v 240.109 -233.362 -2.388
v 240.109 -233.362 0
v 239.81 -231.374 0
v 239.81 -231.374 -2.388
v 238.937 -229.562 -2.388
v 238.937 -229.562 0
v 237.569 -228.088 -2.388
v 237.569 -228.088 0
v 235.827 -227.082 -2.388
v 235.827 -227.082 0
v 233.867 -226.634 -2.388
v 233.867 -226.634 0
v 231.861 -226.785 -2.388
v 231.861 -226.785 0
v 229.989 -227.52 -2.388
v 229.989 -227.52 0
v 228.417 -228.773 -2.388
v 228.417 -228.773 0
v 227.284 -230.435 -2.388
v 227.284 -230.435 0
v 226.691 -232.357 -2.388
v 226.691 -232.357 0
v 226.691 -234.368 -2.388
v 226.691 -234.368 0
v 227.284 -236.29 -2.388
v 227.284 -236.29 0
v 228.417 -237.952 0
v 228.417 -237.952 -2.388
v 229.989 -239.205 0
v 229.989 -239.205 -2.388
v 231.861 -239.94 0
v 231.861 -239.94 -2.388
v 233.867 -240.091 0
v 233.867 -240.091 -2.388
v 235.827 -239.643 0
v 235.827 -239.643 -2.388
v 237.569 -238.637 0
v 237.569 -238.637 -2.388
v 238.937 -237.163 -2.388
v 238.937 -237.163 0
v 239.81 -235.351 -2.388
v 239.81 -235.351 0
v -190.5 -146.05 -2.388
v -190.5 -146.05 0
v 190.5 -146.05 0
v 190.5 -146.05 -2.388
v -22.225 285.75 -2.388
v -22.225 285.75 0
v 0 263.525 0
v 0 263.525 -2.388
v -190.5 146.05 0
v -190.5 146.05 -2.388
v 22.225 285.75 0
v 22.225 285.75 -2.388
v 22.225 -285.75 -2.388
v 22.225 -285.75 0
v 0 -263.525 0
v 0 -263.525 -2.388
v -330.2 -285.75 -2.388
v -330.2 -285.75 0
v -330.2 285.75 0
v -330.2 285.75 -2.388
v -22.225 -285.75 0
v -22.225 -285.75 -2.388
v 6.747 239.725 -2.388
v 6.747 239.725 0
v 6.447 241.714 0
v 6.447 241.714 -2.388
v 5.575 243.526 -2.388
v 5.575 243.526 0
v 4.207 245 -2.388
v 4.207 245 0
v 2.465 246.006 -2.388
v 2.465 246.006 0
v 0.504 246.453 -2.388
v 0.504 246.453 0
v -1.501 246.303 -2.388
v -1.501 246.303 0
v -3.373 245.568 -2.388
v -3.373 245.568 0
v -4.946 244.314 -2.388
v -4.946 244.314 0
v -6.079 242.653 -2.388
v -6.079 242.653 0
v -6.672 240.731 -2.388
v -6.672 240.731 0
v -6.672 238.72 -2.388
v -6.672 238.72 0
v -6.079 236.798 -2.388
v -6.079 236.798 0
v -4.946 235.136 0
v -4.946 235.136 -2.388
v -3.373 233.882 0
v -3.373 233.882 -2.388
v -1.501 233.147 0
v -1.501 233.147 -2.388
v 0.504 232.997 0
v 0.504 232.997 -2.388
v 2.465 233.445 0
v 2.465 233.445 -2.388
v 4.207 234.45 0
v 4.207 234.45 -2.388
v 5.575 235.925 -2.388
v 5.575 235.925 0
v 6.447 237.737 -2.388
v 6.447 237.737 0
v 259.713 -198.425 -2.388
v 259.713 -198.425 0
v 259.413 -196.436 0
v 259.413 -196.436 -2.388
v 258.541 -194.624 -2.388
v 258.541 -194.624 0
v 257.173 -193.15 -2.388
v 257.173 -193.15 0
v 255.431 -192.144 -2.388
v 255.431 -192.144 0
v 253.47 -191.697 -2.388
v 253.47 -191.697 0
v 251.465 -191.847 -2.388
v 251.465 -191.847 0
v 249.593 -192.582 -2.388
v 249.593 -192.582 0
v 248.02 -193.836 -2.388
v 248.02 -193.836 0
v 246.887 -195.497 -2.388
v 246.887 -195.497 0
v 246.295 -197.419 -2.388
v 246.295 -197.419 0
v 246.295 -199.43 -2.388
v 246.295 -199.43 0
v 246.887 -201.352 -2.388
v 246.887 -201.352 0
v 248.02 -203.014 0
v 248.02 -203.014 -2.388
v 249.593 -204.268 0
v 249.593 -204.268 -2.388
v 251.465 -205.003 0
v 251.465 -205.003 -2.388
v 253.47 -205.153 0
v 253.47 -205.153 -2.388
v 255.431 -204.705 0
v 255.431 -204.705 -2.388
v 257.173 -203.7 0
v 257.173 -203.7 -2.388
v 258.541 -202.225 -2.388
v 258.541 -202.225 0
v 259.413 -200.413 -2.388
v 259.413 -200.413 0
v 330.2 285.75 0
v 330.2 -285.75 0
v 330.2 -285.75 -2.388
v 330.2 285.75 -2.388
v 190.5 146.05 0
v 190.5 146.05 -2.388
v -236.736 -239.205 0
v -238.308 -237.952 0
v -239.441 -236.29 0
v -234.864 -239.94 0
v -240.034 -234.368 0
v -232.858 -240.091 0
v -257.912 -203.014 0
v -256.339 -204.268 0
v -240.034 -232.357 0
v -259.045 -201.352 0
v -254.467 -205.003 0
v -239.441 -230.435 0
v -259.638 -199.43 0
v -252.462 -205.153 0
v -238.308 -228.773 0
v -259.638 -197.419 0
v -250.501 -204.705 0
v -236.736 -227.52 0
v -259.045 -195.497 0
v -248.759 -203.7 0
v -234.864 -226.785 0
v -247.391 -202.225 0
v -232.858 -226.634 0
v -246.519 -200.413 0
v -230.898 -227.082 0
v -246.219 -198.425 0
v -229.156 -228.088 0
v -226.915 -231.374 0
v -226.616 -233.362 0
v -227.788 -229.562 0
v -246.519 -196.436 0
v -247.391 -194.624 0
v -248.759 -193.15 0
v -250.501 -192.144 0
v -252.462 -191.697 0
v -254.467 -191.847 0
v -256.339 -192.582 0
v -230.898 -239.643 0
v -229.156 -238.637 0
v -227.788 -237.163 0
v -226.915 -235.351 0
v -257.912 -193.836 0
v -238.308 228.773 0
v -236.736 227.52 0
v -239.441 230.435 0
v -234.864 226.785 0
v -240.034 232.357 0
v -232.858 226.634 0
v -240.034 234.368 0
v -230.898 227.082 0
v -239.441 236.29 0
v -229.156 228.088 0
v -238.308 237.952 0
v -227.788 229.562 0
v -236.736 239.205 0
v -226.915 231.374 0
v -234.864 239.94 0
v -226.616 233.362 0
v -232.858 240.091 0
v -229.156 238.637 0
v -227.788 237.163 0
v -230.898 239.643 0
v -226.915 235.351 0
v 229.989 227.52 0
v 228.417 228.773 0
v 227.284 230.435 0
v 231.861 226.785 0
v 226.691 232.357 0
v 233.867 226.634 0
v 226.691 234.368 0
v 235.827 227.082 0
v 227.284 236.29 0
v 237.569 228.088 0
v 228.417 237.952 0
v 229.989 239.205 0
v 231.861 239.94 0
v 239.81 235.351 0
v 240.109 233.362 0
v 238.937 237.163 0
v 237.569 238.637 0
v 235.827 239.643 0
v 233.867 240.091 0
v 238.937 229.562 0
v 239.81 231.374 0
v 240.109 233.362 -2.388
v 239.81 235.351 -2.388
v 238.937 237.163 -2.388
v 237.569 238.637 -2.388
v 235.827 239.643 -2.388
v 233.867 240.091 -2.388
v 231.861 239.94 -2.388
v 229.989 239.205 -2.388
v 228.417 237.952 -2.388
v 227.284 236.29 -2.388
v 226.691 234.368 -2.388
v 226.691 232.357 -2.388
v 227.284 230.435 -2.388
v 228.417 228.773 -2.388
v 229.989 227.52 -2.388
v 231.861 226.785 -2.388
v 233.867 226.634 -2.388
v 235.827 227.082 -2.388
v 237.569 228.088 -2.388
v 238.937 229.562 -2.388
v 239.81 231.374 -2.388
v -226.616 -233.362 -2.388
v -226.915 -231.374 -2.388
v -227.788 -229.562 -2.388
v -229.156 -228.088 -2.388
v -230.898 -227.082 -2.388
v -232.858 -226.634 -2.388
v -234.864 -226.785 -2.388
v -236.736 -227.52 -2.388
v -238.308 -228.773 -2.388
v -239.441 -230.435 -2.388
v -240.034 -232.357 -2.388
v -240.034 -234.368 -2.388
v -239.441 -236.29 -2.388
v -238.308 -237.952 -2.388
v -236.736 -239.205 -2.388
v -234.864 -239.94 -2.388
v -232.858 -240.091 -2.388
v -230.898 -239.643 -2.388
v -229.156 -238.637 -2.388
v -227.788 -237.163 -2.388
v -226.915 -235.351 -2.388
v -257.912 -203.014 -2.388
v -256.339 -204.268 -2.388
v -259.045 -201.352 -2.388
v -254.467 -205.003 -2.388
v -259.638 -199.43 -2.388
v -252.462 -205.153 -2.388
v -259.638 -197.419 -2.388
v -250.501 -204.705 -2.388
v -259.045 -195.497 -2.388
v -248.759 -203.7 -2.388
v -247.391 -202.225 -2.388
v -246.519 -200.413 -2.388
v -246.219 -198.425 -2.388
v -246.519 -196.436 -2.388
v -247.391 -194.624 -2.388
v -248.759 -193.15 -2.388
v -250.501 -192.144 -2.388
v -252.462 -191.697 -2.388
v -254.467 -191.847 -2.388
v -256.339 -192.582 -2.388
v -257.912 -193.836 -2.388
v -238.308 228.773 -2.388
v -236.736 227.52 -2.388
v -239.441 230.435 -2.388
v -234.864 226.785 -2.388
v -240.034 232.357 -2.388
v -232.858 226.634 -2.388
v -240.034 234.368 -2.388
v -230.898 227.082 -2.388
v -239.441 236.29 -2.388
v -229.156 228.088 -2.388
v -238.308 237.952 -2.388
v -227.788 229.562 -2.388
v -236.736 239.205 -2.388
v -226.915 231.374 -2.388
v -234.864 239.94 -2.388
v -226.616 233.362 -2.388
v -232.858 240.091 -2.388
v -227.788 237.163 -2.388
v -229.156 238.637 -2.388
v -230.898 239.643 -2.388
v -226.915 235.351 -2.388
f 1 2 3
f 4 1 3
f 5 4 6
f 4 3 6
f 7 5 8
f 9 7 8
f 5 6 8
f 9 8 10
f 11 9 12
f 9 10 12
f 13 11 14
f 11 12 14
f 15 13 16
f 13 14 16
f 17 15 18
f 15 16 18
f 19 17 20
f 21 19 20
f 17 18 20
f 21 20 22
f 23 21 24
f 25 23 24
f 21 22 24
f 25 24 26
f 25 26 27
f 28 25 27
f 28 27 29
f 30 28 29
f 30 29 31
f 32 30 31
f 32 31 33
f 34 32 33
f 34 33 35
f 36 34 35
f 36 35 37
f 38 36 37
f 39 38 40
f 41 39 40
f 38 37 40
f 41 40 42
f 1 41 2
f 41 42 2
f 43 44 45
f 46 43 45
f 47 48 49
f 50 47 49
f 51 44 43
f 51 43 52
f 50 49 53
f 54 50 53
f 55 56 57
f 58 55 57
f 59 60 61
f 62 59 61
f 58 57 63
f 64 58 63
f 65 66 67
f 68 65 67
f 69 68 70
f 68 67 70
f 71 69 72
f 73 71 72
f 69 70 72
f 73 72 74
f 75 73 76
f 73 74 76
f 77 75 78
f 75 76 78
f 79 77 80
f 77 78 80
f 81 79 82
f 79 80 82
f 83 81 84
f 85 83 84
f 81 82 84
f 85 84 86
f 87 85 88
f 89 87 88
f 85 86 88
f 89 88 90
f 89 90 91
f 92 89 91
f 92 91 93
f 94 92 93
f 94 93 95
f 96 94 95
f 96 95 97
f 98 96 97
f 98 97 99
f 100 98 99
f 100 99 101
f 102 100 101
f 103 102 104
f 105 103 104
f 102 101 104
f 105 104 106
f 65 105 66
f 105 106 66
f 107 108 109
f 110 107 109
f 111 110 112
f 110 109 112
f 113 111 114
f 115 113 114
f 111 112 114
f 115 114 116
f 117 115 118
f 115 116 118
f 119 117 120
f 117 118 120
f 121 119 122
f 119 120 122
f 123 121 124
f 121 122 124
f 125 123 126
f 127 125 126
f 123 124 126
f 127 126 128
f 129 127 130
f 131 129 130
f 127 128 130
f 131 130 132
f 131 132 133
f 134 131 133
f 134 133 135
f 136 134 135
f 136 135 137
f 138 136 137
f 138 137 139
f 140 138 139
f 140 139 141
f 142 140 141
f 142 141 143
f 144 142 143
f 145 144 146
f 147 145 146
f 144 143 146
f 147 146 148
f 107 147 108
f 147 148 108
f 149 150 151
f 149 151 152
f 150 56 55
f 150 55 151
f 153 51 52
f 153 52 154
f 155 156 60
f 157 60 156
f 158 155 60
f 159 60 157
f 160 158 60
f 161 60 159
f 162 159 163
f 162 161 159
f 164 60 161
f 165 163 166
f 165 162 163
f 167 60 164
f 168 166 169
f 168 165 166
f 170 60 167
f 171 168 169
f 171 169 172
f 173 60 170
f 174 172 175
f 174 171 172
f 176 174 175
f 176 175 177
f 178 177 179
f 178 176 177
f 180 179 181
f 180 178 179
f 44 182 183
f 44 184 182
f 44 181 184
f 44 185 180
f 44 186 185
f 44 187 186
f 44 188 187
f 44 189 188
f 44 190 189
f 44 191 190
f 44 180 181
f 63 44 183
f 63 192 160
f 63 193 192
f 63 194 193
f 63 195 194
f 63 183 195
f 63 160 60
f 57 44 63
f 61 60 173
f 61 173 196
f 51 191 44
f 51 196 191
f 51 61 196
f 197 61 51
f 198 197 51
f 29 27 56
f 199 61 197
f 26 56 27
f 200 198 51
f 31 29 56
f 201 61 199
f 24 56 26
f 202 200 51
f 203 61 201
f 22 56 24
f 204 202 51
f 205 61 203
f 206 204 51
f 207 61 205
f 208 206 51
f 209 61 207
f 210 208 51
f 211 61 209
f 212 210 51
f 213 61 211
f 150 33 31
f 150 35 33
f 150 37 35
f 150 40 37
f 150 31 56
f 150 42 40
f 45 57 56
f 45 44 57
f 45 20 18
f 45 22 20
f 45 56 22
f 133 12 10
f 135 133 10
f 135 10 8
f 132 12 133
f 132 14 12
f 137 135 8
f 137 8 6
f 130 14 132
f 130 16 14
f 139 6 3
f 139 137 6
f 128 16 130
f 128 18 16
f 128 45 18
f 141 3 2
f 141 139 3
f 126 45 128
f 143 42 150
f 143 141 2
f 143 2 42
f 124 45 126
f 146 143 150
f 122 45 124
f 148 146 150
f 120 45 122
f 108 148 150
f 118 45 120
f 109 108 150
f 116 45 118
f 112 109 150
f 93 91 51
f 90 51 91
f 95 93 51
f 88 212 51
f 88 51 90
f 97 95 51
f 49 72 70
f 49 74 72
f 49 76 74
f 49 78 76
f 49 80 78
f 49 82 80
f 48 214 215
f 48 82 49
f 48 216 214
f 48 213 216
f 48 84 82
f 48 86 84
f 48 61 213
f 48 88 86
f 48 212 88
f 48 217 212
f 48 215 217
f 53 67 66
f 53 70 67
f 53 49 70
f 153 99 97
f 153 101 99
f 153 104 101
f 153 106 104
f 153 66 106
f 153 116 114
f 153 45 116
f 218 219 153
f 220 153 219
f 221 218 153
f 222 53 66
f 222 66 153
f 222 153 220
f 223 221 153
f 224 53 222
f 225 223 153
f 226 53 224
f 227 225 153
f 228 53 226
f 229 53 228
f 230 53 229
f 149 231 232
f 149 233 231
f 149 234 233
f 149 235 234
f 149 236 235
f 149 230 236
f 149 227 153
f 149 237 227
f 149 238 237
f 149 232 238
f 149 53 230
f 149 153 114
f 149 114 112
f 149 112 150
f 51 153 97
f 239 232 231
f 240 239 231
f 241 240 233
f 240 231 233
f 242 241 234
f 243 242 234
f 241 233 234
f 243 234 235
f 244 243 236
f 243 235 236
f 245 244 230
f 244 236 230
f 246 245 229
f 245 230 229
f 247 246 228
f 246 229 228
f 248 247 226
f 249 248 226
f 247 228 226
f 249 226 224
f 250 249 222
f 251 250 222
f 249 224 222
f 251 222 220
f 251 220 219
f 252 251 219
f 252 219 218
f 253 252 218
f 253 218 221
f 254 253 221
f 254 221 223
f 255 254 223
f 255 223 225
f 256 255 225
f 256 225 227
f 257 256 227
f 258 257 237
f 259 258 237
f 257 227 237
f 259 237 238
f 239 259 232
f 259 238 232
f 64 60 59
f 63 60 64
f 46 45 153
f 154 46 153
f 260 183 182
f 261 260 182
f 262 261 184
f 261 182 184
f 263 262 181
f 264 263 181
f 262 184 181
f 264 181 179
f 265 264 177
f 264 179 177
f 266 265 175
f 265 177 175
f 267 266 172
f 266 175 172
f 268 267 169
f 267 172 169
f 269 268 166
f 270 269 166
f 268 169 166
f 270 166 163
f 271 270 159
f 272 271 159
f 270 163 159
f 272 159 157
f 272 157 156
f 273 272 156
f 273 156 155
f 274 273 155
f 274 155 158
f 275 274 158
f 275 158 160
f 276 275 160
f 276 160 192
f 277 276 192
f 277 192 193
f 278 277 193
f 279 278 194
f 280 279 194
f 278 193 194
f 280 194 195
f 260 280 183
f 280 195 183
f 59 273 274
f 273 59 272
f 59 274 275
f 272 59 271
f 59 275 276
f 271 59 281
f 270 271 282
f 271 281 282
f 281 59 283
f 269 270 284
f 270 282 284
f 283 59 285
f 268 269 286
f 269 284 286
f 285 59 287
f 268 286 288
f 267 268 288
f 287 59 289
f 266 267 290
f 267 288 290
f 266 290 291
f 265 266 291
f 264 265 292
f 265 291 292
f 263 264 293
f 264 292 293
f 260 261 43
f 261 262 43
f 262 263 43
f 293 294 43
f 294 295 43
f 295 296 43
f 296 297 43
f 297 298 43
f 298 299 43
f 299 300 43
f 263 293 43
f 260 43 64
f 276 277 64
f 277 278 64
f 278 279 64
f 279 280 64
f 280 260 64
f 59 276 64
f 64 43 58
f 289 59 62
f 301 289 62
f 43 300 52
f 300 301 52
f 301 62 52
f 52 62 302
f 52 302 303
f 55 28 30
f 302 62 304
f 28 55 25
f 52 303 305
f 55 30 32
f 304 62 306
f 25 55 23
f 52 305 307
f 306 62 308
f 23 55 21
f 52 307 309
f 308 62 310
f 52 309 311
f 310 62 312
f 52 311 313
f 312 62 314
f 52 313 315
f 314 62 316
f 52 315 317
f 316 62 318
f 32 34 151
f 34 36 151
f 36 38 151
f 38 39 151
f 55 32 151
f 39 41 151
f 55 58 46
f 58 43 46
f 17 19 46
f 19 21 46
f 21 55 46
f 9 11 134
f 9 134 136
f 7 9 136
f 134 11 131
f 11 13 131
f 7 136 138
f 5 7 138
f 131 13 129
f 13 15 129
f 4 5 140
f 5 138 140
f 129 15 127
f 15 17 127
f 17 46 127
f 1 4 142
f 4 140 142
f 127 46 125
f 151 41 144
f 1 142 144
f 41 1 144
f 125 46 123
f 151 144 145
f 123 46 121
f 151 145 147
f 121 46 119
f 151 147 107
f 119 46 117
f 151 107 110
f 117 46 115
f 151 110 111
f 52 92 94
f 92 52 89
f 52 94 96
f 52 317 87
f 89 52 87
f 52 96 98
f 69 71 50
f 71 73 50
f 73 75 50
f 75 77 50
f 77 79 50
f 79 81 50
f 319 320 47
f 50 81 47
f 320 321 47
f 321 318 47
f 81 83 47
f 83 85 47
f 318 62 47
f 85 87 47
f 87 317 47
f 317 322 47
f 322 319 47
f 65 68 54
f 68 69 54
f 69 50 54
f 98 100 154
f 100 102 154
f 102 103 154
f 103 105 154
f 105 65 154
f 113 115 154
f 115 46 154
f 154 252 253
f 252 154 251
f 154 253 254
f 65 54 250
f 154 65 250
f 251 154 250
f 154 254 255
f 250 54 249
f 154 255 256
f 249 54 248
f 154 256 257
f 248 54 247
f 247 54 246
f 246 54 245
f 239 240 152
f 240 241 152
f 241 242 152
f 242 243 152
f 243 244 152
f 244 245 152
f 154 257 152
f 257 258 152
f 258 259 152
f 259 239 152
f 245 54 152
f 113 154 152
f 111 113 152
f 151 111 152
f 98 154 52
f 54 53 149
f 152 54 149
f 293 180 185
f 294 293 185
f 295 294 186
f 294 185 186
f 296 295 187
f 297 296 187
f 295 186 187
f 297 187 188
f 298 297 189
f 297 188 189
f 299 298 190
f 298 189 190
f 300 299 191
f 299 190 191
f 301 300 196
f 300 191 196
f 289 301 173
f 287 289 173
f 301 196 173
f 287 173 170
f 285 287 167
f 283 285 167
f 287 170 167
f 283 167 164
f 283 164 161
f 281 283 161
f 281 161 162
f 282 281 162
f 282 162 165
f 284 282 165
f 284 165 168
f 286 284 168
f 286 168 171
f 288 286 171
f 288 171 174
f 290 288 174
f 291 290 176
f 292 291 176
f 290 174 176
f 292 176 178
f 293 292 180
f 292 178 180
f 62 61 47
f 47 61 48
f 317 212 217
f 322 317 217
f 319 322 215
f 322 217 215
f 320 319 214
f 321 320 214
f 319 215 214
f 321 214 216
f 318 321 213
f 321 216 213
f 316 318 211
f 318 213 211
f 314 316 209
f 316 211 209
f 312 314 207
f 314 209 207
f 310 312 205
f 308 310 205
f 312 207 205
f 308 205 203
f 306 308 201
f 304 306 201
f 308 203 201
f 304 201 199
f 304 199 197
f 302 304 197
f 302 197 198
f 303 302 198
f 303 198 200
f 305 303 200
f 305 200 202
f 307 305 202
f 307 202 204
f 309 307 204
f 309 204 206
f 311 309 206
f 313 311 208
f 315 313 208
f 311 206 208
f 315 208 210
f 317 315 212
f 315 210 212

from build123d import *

# Parameters (mm, degrees)
F0_W     = 660.4
F0_H     = 571.5
F0_R     = 6.746875
F1_DEPTH = 2.3876
F3_DEPTH = 2.3886
F4_W     = 381
F4_H     = 292.1
F5_DEPTH = 2.3886


with BuildPart() as f1:
    # F0 (on Top) → F1 (new body)
    with BuildSketch(Plane.XY):
        Rectangle(F0_W, F0_H)
        with Locations((-233.3625, -233.3625)):
            Circle(F0_R, mode=Mode.SUBTRACT)
        with Locations((-252.96602, -198.4248)):
            Circle(F0_R, mode=Mode.SUBTRACT)
        with Locations((233.3625, -233.3625)):
            Circle(F0_R, mode=Mode.SUBTRACT)
        with Locations((252.96602, -198.4248)):
            Circle(F0_R, mode=Mode.SUBTRACT)
        with Locations((-233.3625, 233.3625)):
            Circle(F0_R, mode=Mode.SUBTRACT)
        with Locations((0, 239.7252)):
            Circle(F0_R, mode=Mode.SUBTRACT)
        with Locations((233.3625, 233.3625)):
            Circle(F0_R, mode=Mode.SUBTRACT)
    extrude(amount=-F1_DEPTH)

    # F2 (on Top) → F3 (cut, through all)
    with BuildSketch(Plane.XY):
        Polygon((22.225, 285.75), (-22.225, 285.75), (0, 263.525), align=None)
        Polygon((-22.225, -285.75), (22.225, -285.75), (0, -263.525), align=None)
    extrude(amount=-F3_DEPTH, mode=Mode.SUBTRACT)

    # F4 (on Top) → F5 (cut, through all)
    with BuildSketch(Plane.XY):
        Rectangle(F4_W, F4_H)
    extrude(amount=-F5_DEPTH, mode=Mode.SUBTRACT)


solid = f1.part
